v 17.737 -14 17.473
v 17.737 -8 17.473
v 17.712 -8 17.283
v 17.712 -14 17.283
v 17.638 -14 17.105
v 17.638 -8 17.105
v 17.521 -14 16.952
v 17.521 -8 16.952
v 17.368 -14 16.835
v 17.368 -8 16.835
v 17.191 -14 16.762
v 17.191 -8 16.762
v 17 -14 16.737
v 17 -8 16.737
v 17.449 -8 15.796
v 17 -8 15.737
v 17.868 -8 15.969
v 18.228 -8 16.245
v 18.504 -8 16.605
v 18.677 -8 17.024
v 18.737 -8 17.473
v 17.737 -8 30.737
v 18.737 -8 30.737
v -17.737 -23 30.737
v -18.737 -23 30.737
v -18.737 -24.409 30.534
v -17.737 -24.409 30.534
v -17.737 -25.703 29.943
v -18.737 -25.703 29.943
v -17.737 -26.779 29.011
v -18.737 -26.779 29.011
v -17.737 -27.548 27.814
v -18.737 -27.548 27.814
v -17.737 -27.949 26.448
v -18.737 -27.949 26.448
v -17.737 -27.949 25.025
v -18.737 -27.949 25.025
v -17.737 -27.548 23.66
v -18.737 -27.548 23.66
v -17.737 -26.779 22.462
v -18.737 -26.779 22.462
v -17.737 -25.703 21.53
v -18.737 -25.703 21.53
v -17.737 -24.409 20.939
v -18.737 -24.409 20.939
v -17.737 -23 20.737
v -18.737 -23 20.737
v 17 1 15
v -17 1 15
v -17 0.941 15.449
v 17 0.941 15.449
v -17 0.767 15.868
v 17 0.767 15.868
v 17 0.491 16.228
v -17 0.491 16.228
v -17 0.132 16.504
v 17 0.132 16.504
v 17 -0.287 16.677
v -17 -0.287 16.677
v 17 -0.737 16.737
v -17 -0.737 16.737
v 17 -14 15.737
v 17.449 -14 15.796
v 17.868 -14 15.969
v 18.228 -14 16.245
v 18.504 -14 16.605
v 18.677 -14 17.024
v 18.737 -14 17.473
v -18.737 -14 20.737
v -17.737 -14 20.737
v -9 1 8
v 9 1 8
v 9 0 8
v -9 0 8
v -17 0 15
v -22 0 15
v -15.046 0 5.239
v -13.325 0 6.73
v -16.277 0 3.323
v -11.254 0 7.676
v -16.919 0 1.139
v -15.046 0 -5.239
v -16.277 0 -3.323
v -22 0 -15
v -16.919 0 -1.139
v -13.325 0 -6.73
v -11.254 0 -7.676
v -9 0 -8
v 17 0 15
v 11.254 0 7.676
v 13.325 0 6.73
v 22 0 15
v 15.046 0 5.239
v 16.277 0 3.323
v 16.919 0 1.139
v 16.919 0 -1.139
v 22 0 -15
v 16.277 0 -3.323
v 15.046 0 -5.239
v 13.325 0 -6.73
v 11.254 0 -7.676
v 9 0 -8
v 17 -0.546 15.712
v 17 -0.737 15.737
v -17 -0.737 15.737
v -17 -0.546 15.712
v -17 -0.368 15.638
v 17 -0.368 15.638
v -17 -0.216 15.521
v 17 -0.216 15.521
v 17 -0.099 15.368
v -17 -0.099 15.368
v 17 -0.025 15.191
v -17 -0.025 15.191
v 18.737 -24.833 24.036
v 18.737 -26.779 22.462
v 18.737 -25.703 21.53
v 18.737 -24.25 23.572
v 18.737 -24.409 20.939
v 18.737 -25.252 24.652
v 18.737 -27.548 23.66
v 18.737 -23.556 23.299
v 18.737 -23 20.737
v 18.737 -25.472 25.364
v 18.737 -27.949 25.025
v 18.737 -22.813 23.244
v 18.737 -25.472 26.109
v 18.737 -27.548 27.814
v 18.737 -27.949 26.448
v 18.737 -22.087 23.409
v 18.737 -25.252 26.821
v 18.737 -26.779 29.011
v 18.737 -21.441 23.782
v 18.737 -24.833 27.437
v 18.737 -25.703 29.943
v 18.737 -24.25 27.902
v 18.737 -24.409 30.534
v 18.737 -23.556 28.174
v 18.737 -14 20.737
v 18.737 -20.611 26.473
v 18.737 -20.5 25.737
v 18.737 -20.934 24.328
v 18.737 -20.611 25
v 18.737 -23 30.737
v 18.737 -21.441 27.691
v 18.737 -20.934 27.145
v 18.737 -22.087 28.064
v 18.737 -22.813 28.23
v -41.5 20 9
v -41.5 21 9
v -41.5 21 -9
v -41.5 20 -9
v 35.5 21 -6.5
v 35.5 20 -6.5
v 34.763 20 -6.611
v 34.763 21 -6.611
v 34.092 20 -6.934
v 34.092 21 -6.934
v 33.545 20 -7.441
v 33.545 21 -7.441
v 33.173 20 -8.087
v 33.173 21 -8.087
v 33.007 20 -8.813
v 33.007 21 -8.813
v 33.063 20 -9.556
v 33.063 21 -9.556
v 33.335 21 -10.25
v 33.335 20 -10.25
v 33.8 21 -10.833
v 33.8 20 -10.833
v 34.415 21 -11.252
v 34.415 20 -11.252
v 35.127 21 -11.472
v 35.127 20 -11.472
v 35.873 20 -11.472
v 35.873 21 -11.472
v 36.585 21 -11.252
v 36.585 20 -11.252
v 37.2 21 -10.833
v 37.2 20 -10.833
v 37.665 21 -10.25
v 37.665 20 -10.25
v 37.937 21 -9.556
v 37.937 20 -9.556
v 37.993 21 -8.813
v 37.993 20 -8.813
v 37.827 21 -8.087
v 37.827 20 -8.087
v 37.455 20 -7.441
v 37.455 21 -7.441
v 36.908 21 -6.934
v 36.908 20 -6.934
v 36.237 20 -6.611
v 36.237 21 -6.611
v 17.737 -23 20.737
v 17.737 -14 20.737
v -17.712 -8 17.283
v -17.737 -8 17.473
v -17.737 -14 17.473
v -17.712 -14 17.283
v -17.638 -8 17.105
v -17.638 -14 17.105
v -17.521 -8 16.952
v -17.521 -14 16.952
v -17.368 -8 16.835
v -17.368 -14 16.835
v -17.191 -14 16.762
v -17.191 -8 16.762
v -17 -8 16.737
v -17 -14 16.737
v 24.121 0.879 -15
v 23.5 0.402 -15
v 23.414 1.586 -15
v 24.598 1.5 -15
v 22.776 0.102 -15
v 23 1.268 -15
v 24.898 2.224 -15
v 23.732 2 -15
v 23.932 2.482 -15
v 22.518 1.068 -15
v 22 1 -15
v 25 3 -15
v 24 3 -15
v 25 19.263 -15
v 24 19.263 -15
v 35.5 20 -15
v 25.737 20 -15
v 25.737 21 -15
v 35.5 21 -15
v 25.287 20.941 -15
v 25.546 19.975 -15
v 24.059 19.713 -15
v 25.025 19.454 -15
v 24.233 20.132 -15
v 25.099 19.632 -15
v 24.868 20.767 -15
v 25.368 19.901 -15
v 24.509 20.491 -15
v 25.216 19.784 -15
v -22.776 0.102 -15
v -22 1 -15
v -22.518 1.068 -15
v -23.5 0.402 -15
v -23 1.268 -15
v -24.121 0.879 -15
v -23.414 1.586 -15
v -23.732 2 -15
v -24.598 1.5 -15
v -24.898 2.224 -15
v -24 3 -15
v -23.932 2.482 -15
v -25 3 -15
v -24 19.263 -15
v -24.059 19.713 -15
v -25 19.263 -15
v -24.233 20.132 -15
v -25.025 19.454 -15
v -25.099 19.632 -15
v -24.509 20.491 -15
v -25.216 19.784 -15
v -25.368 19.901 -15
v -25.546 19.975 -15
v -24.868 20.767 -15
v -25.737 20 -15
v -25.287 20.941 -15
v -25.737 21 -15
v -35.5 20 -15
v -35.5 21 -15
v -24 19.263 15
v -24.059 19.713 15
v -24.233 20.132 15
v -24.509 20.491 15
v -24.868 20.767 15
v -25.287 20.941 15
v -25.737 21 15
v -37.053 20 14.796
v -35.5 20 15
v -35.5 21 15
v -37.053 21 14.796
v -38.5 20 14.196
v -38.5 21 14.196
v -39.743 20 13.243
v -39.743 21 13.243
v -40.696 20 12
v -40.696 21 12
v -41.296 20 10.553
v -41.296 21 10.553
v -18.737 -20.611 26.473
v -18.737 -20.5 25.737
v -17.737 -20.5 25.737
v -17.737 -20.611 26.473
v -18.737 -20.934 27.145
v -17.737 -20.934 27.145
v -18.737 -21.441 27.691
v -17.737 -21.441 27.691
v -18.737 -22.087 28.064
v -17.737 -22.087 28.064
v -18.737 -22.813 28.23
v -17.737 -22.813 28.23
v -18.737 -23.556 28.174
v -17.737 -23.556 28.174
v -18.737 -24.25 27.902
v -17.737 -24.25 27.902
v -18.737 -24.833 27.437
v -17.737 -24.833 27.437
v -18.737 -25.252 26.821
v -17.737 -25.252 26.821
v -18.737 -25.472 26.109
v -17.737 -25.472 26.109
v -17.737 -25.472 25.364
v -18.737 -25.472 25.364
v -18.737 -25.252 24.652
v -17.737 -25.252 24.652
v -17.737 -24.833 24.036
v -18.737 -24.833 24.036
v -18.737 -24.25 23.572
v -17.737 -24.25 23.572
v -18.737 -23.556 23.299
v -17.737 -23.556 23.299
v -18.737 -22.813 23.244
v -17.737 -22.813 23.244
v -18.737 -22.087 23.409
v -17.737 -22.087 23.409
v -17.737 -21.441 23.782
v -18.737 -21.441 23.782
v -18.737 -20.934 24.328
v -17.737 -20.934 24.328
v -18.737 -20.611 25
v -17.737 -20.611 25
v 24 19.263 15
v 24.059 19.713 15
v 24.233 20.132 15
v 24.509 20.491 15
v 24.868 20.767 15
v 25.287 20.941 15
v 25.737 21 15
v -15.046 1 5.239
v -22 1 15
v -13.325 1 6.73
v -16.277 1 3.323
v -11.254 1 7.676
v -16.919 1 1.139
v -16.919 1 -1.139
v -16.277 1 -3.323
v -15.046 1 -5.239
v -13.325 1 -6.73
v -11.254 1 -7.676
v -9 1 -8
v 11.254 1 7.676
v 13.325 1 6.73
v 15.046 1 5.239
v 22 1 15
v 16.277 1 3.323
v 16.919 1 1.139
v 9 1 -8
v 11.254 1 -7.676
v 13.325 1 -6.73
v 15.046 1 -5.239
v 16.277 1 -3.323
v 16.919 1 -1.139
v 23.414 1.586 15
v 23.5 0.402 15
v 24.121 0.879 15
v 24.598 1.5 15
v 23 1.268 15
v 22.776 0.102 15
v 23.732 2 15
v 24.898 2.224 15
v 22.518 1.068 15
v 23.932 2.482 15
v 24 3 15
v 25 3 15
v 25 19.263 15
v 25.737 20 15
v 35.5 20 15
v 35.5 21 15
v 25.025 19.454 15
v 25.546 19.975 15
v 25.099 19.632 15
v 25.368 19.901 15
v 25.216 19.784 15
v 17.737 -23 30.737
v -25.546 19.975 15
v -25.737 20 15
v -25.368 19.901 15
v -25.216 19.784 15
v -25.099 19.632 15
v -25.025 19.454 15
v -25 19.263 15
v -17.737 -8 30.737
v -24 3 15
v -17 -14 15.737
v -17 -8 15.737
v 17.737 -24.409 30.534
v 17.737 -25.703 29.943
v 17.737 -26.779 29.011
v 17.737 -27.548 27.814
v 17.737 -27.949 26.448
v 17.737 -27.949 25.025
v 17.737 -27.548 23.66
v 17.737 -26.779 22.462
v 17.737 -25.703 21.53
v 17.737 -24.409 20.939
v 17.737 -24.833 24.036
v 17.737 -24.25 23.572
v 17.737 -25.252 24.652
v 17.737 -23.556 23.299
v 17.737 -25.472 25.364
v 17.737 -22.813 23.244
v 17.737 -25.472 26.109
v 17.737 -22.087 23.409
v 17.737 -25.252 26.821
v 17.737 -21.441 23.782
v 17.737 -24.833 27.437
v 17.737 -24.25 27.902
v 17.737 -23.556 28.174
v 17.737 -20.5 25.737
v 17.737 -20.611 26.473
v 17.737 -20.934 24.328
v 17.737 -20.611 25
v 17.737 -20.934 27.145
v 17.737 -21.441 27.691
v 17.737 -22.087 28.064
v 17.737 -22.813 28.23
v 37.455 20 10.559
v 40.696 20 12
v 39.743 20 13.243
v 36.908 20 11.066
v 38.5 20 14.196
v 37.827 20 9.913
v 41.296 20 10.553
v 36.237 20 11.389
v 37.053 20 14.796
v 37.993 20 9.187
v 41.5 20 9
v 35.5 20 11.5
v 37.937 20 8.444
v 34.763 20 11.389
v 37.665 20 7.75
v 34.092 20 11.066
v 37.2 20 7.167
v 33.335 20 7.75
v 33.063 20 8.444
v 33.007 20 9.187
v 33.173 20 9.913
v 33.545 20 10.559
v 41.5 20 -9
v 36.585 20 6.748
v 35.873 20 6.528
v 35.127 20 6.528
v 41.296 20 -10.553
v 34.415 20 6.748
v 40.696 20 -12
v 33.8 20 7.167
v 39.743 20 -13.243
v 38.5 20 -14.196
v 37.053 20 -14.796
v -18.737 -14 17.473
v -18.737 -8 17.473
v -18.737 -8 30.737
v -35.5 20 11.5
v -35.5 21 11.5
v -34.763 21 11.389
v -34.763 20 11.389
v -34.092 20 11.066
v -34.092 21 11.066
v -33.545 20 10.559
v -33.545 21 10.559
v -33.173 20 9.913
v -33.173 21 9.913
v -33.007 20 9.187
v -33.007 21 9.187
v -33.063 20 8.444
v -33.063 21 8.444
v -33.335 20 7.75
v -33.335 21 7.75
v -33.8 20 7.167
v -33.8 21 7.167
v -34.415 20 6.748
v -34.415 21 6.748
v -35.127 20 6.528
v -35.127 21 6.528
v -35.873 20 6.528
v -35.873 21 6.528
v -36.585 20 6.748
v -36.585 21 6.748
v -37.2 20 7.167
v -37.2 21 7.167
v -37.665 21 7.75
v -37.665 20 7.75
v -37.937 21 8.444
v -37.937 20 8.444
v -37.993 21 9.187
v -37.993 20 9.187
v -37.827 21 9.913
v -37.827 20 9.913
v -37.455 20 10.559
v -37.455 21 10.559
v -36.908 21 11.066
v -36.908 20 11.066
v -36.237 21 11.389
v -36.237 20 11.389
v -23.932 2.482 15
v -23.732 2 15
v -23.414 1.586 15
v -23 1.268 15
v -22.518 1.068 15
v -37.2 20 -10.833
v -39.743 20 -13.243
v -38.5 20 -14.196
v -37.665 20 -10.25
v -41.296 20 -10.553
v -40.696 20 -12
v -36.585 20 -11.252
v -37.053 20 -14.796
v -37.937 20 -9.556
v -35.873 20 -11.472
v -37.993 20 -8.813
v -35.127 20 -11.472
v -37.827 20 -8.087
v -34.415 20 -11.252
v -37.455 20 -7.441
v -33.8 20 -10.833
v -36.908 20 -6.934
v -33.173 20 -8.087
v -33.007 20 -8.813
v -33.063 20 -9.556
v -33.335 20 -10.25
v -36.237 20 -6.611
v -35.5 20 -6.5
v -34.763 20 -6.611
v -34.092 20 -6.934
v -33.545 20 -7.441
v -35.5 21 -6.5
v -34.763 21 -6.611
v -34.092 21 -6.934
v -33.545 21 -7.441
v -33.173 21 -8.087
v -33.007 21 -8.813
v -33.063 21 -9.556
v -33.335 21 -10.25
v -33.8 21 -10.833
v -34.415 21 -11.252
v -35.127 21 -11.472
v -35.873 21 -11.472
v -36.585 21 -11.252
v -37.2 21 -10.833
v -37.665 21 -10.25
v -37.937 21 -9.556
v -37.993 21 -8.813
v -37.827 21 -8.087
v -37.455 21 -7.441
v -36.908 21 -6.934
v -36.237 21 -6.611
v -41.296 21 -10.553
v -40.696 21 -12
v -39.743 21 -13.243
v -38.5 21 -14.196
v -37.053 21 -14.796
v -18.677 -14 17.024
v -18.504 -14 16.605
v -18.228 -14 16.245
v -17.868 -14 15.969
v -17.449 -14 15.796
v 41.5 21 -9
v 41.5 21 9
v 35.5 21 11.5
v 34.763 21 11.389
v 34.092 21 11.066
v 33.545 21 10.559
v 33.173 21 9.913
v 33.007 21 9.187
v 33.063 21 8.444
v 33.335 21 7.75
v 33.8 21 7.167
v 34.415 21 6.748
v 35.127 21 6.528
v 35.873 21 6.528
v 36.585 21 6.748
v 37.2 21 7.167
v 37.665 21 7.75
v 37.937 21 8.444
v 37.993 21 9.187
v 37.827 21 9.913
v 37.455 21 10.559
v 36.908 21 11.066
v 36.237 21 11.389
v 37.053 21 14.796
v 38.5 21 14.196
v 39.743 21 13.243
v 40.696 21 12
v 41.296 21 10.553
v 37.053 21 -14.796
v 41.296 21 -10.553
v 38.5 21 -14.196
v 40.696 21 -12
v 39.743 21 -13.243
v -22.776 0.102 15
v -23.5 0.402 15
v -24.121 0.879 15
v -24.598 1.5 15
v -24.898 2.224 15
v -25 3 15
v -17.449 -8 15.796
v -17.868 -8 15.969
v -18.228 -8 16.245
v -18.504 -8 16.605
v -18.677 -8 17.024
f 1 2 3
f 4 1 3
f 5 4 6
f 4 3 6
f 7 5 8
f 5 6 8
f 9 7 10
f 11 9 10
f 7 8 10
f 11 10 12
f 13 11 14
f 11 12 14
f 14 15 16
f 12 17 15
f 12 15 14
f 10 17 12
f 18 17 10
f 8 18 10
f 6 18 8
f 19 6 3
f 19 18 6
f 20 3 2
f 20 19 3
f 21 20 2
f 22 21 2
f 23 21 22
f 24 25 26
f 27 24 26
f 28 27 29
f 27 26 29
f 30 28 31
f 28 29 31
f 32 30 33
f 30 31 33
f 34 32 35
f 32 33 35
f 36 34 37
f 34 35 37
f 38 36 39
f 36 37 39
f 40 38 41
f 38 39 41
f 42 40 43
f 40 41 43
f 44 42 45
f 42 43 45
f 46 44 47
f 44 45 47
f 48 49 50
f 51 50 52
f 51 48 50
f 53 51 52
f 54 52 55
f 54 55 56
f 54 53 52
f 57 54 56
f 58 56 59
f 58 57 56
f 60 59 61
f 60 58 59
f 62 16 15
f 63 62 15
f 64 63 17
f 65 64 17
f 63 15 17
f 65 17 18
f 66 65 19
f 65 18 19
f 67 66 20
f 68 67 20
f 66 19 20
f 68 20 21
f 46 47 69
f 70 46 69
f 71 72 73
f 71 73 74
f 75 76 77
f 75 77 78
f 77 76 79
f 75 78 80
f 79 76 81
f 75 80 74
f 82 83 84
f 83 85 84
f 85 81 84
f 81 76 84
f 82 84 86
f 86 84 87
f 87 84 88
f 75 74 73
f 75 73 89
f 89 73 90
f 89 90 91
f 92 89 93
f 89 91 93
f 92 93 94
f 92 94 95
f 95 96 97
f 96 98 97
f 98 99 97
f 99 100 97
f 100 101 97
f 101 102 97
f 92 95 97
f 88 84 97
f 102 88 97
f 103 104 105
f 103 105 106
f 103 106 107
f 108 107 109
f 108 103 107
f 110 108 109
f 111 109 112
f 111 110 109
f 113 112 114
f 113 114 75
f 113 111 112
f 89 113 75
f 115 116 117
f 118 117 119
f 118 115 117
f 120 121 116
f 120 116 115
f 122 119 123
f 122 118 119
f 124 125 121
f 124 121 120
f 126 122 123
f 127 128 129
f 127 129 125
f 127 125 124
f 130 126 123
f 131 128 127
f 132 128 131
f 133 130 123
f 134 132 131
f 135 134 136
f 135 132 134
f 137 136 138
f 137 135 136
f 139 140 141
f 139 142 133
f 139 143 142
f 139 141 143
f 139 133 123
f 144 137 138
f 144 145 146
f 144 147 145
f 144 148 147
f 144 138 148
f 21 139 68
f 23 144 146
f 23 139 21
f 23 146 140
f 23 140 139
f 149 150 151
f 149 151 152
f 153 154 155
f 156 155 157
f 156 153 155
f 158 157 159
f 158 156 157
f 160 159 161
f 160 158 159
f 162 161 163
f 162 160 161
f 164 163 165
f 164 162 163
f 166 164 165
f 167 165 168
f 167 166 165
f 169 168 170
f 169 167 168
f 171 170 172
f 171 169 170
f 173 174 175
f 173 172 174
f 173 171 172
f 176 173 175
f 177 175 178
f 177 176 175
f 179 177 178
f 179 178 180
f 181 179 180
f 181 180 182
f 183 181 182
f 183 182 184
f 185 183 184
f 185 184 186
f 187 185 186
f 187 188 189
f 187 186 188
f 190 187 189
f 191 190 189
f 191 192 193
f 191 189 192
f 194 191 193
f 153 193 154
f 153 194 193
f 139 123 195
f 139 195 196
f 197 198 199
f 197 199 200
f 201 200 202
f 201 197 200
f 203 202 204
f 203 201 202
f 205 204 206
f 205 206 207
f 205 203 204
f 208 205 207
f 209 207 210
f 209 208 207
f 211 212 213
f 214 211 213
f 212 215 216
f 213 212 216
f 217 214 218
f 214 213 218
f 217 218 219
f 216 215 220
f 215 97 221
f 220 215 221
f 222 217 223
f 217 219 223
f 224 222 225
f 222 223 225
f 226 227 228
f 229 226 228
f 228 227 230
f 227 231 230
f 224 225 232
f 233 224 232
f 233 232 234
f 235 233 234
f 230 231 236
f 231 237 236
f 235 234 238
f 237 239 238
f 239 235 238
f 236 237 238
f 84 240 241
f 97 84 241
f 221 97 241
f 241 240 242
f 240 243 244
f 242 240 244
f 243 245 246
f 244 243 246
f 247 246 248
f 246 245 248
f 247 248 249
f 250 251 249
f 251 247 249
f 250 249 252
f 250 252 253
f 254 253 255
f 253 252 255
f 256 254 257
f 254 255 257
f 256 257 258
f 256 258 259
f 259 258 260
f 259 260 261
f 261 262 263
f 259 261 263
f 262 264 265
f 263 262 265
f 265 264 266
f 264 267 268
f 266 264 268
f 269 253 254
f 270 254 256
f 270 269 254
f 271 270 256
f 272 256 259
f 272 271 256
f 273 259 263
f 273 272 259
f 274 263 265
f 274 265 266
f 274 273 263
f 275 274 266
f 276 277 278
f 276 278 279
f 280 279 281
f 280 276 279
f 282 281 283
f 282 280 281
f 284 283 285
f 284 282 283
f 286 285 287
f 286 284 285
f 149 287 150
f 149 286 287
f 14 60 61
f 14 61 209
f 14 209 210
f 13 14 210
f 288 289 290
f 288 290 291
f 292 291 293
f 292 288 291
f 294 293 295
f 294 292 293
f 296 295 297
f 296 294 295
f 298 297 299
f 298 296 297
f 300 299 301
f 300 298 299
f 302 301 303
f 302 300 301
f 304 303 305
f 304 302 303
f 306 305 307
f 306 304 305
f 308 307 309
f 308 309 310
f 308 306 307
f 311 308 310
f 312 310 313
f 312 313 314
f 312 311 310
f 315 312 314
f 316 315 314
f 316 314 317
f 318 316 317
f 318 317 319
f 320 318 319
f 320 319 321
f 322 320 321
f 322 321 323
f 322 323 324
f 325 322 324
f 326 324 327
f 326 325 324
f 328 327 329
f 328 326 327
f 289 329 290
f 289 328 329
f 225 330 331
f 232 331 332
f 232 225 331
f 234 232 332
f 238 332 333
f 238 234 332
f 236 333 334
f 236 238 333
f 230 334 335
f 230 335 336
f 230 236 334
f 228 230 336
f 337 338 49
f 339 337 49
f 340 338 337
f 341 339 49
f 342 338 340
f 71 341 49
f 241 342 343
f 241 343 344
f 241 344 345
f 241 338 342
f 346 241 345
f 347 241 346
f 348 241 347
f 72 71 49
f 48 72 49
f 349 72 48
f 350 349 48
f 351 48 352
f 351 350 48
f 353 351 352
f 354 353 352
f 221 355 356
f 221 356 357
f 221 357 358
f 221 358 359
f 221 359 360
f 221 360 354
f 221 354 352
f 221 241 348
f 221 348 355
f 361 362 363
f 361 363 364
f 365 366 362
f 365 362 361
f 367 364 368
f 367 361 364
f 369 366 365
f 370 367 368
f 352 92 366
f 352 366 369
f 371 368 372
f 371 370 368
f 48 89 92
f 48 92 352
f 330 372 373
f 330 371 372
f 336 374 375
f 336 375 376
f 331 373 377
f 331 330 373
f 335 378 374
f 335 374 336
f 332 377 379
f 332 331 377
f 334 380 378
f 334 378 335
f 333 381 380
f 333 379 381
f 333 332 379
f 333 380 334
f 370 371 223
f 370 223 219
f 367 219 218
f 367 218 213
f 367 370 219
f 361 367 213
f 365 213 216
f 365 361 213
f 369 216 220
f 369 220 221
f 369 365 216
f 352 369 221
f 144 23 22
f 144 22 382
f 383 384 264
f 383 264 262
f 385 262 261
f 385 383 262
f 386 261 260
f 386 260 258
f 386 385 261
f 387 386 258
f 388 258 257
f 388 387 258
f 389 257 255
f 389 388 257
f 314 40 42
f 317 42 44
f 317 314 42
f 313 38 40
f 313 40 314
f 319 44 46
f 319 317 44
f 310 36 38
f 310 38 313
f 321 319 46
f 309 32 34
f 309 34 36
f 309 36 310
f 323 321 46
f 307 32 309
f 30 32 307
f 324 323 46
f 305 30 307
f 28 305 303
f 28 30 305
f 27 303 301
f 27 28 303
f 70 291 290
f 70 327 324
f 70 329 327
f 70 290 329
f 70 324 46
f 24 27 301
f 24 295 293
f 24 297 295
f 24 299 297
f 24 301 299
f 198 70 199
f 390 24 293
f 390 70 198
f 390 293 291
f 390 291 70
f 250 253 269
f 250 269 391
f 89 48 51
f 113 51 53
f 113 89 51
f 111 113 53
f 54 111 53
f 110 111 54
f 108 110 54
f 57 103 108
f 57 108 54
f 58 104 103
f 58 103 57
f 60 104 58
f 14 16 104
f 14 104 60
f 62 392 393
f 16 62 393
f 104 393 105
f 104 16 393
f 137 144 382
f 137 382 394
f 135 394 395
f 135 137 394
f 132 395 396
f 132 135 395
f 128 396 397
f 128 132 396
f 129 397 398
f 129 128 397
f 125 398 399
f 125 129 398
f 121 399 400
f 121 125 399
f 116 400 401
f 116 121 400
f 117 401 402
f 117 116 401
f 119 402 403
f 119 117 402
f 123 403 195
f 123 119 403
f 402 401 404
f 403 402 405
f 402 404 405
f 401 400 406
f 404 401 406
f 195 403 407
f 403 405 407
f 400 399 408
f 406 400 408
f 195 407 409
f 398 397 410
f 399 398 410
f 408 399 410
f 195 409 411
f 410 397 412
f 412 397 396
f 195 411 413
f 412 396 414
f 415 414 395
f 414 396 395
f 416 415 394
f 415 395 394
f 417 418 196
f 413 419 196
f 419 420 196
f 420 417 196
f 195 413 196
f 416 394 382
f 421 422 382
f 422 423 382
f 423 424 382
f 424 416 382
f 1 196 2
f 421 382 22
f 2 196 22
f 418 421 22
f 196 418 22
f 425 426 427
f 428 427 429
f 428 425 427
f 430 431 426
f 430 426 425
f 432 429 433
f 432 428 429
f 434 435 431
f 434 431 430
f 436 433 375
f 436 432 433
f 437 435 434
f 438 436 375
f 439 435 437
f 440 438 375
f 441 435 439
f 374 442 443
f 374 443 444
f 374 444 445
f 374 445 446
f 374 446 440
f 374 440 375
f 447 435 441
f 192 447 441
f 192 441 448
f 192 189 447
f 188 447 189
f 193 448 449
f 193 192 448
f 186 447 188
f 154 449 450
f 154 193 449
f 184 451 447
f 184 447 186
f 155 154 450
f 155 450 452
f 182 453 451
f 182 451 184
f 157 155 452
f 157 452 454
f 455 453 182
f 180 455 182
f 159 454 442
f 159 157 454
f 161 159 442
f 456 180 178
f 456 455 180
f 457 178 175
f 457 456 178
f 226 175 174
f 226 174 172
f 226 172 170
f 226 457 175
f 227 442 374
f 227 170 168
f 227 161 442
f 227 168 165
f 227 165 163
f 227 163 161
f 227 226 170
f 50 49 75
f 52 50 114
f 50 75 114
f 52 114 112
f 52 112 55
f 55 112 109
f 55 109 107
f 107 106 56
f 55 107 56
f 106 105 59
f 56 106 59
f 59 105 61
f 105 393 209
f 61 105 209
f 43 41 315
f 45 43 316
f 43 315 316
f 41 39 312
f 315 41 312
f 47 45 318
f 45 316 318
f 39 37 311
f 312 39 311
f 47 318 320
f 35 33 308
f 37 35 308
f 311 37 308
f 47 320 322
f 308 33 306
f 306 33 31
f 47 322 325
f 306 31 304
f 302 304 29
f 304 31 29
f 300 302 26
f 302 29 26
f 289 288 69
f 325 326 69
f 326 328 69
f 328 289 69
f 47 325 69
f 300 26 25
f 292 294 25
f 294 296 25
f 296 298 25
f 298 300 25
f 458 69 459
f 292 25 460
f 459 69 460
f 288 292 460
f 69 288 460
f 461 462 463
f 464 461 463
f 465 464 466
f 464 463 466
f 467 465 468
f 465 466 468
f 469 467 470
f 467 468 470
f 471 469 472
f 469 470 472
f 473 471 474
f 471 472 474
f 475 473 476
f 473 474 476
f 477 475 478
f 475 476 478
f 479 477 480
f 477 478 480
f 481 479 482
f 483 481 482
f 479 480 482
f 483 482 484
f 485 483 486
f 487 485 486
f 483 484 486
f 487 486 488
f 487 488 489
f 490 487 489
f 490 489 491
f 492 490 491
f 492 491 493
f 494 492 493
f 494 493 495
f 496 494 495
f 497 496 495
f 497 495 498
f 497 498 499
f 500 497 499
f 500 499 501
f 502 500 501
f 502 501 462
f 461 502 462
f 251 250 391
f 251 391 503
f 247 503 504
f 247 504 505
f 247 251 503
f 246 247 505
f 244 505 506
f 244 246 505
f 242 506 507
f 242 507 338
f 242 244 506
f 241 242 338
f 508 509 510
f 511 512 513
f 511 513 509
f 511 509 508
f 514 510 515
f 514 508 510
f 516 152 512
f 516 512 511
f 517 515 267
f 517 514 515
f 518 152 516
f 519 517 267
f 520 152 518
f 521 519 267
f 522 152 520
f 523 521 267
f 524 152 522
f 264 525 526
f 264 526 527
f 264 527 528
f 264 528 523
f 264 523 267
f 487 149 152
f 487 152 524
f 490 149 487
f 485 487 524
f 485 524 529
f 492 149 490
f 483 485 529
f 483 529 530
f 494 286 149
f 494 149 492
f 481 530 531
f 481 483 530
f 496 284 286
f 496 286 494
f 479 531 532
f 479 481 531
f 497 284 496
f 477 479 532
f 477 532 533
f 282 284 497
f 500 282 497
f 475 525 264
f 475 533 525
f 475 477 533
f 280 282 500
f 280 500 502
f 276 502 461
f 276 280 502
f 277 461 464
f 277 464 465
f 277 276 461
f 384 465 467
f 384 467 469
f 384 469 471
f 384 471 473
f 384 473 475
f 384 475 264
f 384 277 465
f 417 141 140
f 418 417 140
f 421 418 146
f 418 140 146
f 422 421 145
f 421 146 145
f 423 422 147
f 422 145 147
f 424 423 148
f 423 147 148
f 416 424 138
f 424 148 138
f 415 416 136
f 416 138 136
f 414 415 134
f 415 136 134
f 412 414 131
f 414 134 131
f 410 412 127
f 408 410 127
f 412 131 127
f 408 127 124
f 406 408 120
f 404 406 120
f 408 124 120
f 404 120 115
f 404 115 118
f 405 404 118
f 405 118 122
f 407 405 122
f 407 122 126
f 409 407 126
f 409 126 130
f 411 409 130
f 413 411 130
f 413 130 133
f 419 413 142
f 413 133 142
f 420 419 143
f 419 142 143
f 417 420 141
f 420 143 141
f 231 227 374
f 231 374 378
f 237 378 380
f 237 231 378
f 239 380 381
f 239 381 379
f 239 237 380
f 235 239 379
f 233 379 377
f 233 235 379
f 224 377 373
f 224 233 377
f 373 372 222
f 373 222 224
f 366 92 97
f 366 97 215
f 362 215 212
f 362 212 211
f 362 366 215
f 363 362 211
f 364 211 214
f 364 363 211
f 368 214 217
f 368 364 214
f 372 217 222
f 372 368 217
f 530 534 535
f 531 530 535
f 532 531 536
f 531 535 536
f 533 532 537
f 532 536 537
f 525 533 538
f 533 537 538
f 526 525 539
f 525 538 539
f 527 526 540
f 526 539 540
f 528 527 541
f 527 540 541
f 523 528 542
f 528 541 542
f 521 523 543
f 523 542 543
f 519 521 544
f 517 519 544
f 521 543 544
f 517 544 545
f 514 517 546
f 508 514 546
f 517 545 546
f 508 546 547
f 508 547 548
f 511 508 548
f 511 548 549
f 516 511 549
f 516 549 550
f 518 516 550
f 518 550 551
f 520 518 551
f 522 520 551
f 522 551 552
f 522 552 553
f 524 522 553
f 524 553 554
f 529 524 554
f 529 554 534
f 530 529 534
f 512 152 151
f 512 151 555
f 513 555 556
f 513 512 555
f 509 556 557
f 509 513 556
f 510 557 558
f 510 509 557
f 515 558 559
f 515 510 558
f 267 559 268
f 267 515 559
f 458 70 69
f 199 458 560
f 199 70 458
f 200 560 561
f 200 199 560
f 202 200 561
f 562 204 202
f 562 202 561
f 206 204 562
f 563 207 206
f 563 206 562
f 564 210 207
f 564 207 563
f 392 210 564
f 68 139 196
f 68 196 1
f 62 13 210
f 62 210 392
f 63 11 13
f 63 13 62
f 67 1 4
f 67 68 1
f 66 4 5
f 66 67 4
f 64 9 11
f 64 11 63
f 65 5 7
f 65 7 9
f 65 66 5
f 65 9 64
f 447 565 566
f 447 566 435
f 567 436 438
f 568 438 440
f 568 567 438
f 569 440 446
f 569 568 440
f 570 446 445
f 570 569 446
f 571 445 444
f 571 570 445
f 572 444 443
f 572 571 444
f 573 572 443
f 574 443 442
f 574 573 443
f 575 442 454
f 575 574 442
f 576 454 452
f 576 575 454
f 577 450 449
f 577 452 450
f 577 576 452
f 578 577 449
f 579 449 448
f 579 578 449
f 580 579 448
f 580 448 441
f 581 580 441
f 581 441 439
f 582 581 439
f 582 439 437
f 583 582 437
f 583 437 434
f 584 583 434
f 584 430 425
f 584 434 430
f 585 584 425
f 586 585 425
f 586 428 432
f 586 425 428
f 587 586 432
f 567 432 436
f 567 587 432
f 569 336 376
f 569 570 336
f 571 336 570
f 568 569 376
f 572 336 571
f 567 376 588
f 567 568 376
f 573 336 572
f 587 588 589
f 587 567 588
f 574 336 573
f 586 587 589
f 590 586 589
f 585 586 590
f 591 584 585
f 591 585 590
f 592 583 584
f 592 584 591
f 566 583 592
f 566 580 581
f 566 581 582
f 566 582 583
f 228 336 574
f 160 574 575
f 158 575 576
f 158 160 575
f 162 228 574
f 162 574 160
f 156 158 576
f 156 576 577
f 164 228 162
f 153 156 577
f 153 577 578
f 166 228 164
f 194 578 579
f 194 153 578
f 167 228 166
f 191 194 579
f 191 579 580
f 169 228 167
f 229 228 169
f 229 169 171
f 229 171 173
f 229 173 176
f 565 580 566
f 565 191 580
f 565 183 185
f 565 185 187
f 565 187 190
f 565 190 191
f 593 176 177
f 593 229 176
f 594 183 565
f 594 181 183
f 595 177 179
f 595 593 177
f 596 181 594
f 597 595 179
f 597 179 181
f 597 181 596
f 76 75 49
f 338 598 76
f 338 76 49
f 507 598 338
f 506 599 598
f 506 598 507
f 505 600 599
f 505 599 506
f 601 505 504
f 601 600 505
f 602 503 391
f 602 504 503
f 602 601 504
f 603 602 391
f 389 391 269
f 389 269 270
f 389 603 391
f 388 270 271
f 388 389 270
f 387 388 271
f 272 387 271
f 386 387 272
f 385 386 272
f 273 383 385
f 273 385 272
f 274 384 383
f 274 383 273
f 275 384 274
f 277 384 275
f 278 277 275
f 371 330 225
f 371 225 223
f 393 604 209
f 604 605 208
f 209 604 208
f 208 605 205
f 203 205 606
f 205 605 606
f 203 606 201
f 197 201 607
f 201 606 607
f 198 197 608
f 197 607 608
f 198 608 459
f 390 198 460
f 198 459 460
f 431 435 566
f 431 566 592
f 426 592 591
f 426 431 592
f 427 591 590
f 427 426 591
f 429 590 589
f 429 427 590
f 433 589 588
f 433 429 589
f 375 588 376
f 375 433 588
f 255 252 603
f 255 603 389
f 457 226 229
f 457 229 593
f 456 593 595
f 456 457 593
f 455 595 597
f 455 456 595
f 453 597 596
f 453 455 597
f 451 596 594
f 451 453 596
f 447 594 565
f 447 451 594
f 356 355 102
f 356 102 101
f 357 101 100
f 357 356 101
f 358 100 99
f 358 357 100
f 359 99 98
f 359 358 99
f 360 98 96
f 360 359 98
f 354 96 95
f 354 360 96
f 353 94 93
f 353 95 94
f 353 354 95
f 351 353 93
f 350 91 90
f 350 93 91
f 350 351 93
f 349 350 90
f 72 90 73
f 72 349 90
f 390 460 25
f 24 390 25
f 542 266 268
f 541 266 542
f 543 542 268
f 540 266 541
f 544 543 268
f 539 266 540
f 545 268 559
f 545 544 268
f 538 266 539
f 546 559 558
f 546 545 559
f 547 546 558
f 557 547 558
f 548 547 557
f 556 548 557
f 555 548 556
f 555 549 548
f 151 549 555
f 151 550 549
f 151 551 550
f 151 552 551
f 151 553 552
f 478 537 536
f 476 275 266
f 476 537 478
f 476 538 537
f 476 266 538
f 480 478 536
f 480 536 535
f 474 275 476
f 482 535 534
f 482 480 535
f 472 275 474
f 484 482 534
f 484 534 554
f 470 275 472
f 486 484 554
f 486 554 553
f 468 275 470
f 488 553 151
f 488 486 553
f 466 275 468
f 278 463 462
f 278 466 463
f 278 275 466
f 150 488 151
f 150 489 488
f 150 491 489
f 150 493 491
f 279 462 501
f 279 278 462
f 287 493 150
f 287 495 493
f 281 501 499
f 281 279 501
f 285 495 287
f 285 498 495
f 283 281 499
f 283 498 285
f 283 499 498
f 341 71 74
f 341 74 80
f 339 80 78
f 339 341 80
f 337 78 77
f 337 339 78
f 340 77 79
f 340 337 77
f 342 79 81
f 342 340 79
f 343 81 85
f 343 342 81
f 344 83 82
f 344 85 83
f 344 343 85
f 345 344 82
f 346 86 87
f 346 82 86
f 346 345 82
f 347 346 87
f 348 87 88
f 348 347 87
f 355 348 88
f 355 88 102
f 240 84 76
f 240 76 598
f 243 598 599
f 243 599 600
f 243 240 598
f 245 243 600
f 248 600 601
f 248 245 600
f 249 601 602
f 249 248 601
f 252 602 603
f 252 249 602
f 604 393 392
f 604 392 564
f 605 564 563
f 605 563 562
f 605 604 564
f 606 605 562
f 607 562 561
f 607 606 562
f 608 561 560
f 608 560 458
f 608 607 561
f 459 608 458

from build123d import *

# Parameters (mm, degrees)
SKETCH1_W                      = 50
SKETCH1_H                      = 30
BASE_FLANGE1_DEPTH             = 1
EDGE_FLANGE1_STRIP_W           = 8
EDGE_FLANGE1_STRIP_H           = 1
EDGE_FLANGE1_STRIP_CUT_DEPTH   = 30
EDGE_FLANGE1_STRIP_2_W         = 8
EDGE_FLANGE1_STRIP_2_H         = 1
EDGE_FLANGE1_STRIP_CUT_2_DEPTH = 30
EDGE_FLANGE1_DEPTH             = 30
EDGE_FLANGE1_BEND_DEPTH        = 30
EDGE_FLANGE2_STRIP_W           = 5.4732
EDGE_FLANGE2_STRIP_H           = 1
EDGE_FLANGE2_STRIP_CUT_DEPTH   = 30
EDGE_FLANGE2_STRIP_2_W         = 5.4732
EDGE_FLANGE2_STRIP_2_H         = 1
EDGE_FLANGE2_STRIP_CUT_2_DEPTH = 30
EDGE_FLANGE2_DEPTH             = 30
EDGE_FLANGE2_BEND_DEPTH        = 30
BREAK_CORNER1_START            = 20
BREAK_CORNER1_DEPTH            = 1
CUT_EXTRUDE1_DEPTH             = 10
SKETCH25_R                     = 2.5
CUT_EXTRUDE2_DEPTH             = 10
EDGE_FLANGE3_DEPTH             = 34
EDGE_FLANGE4_DEPTH             = 6
EDGE_FLANGE4_START             = -1
EDGE_FLANGE4_PROFILE_R         = 2.5
EDGE_FLANGE4_FLAT_DEPTH        = 1


# Read off the part's stored shape, not the designer's step: Break-Corner1
# Sheet-metal steps are written as plain solids
with BuildPart() as part:
    # Sketch1 → Base-Flange1 (new body)
    with BuildSketch(Plane(origin=(0, 0, 0), x_dir=(1, 0, 0), z_dir=(0, 1, 0))):
        Rectangle(SKETCH1_W, SKETCH1_H)
    extrude(amount=BASE_FLANGE1_DEPTH)

    # Edge-Flange1 strip (across the edge) → Edge-Flange1 strip cut (cut)
    with BuildSketch(Plane(origin=(25, 1, 15), x_dir=(-1, 0, 0), z_dir=(0, 0, -1))):
        with Locations((-1, -0.5)):
            Rectangle(EDGE_FLANGE1_STRIP_W, EDGE_FLANGE1_STRIP_H)
    extrude(amount=EDGE_FLANGE1_STRIP_CUT_DEPTH, mode=Mode.SUBTRACT)

    # Edge-Flange1 strip 2 (across the edge) → Edge-Flange1 strip cut 2 (cut)
    with BuildSketch(Plane(origin=(-25, 1, -15), x_dir=(1, 0, 0), z_dir=(0, 0, 1))):
        with Locations((-1, -0.5)):
            Rectangle(EDGE_FLANGE1_STRIP_2_W, EDGE_FLANGE1_STRIP_2_H)
    extrude(amount=EDGE_FLANGE1_STRIP_CUT_2_DEPTH, mode=Mode.SUBTRACT)

    # Edge-Flange1 section (across the edge) → Edge-Flange1 (add)
    with BuildSketch(Plane(origin=(25, 1, 15), x_dir=(-1, 0, 0), z_dir=(0, 0, -1))):
        with BuildLine():
            Line((0, 2), (0, 19))
            Line((0, 19), (1, 19))
            Line((1, 19), (1, 2))
            ThreePointArc((1, 2), (1.585786438, 0.585786438), (3, 0))
            Line((3, 0), (3, -1))
            ThreePointArc((3, -1), (0.878679656, -0.121320344), (0, 2))
        make_face()
    extrude(amount=EDGE_FLANGE1_DEPTH)

    # Edge-Flange1 section 2 (across the edge) → Edge-Flange1 bend (add)
    with BuildSketch(Plane(origin=(-25, 1, -15), x_dir=(1, 0, 0), z_dir=(0, 0, 1))):
        with BuildLine():
            Line((0, 2), (0, 19))
            Line((0, 19), (1, 19))
            Line((1, 19), (1, 2))
            ThreePointArc((1, 2), (1.585786438, 0.585786438), (3, 0))
            Line((3, 0), (3, -1))
            ThreePointArc((3, -1), (0.878679656, -0.121320344), (0, 2))
        make_face()
    extrude(amount=EDGE_FLANGE1_BEND_DEPTH)

    # Edge-Flange2 strip (across the edge) → Edge-Flange2 strip cut (cut)
    with BuildSketch(Plane(origin=(25, 20, -15), x_dir=(0, -1, 0), z_dir=(0, 0, 1))):
        with Locations((-2, -0.5)):
            Rectangle(EDGE_FLANGE2_STRIP_W, EDGE_FLANGE2_STRIP_H)
    extrude(amount=EDGE_FLANGE2_STRIP_CUT_DEPTH, mode=Mode.SUBTRACT)

    # Edge-Flange2 strip 2 (across the edge) → Edge-Flange2 strip cut 2 (cut)
    with BuildSketch(Plane(origin=(-25, 20, 15), x_dir=(0, -1, 0), z_dir=(0, 0, -1))):
        with Locations((-2, -0.5)):
            Rectangle(EDGE_FLANGE2_STRIP_2_W, EDGE_FLANGE2_STRIP_2_H)
    extrude(amount=EDGE_FLANGE2_STRIP_CUT_2_DEPTH, mode=Mode.SUBTRACT)

    # Edge-Flange2 section (across the edge) → Edge-Flange2 (add)
    with BuildSketch(Plane(origin=(25, 20, -15), x_dir=(0, -1, 0), z_dir=(0, 0, 1))):
        with BuildLine():
            Line((-1, 0.7366), (-1, 16.5))
            Line((-1, 16.5), (0, 16.5))
            Line((0, 16.5), (0, 0.7366))
            ThreePointArc((0, 0.7366), (0.215745145, 0.215745145), (0.7366, 0))
            Line((0.7366, 0), (0.7366, -1))
            ThreePointArc((0.7366, -1), (-0.491361636, -0.491361636), (-1, 0.7366))
        make_face()
    extrude(amount=EDGE_FLANGE2_DEPTH)

    # Edge-Flange2 section 2 (across the edge) → Edge-Flange2 bend (add)
    with BuildSketch(Plane(origin=(-25, 20, 15), x_dir=(0, -1, 0), z_dir=(0, 0, -1))):
        with BuildLine():
            Line((-1, 0.7366), (-1, 16.5))
            Line((-1, 16.5), (0, 16.5))
            Line((0, 16.5), (0, 0.7366))
            ThreePointArc((0, 0.7366), (0.215745145, 0.215745145), (0.7366, 0))
            Line((0.7366, 0), (0.7366, -1))
            ThreePointArc((0.7366, -1), (-0.491361636, -0.491361636), (-1, 0.7366))
        make_face()
    extrude(amount=EDGE_FLANGE2_BEND_DEPTH)

    # Break-Corner1 outline → Break-Corner1 (cut)
    with BuildSketch(Plane(origin=(0, 0, 0), x_dir=(1, 0, 0), z_dir=(0, 1, 0)).offset(BREAK_CORNER1_START)):
        with BuildLine():
            Line((41.5, -15), (41.5, -9))
            ThreePointArc((41.5, -9), (39.742640687, -13.242640687), (35.5, -15))
            Line((35.5, -15), (41.5, -15))
        make_face()
        with BuildLine():
            ThreePointArc((35.5, 15), (39.742640687, 13.242640687), (41.5, 9))
            Line((41.5, 9), (41.5, 15))
            Line((41.5, 15), (35.5, 15))
        make_face()
        with BuildLine():
            Line((-41.5, -15), (-35.5, -15))
            ThreePointArc((-35.5, -15), (-39.742640687, -13.242640687), (-41.5, -9))
            Line((-41.5, -9), (-41.5, -15))
        make_face()
        with BuildLine():
            Line((-41.5, 15), (-41.5, 9))
            ThreePointArc((-41.5, 9), (-39.742640687, 13.242640687), (-35.5, 15))
            Line((-35.5, 15), (-41.5, 15))
        make_face()
    extrude(amount=BREAK_CORNER1_DEPTH, mode=Mode.SUBTRACT)

    # Sketch24 → Cut-Extrude1 (cut)
    with BuildSketch(Plane(origin=(0, 1, 0), x_dir=(1, 0, 0), z_dir=(0, 1, 0))):
        with BuildLine():
            Line((-9, 8), (9, 8))
            ThreePointArc((9, 8), (17, 0), (9, -8))
            Line((9, -8), (-9, -8))
            ThreePointArc((-9, -8), (-17, 0), (-9, 8))
        make_face()
    extrude(amount=-CUT_EXTRUDE1_DEPTH, mode=Mode.SUBTRACT)

    # Sketch25 → Cut-Extrude2 (cut)
    with BuildSketch(Plane(origin=(0, 21, 0), x_dir=(1, 0, 0), z_dir=(0, 1, 0))):
        with Locations(Location((-35.5, 9, 0), (0, 0, 270))):
            Circle(SKETCH25_R)
        with Locations(Location((-35.5, -9, 0), (0, 0, 270))):
            Circle(SKETCH25_R)
    cut_extrude2 = extrude(amount=-CUT_EXTRUDE2_DEPTH, mode=Mode.SUBTRACT)

    # Mirror1: Cut-Extrude2 across plane
    add(cut_extrude2.mirror(Plane(origin=(0, 0, 0), x_dir=(0, 0, 1), z_dir=(1, 0, 0))), mode=Mode.SUBTRACT)

    # Edge-Flange3 section (across the edge) → Edge-Flange3 (add)
    with BuildSketch(Plane(origin=(17, 0, 15.7366), x_dir=(0, 0, -1), z_dir=(-1, 0, 0))):
        with BuildLine():
            Line((-1, 0.7366), (-1, 14))
            Line((-1, 14), (0, 14))
            Line((0, 14), (0, 0.7366))
            ThreePointArc((0, 0.7366), (0.215745145, 0.215745145), (0.7366, 0))
            Line((0.7366, 0), (0.7366, -1))
            ThreePointArc((0.7366, -1), (-0.491361636, -0.491361636), (-1, 0.7366))
        make_face()
    extrude(amount=EDGE_FLANGE3_DEPTH)

    # Edge-Flange4 bend section (across the edge) → Edge-Flange4 (add)
    with BuildSketch(Plane(origin=(-17.7366, -8, 16.7366), x_dir=(1, 0, 0), z_dir=(0, -1, 0))):
        with BuildLine():
            Line((-1, 0.7366), (0, 0.7366))
            ThreePointArc((0, 0.7366), (0.215745145, 0.215745145), (0.7366, 0))
            Line((0.7366, 0), (0.7366, -1))
            ThreePointArc((0.7366, -1), (-0.491361636, -0.491361636), (-1, 0.7366))
        make_face()
    edge_flange4 = extrude(amount=EDGE_FLANGE4_DEPTH)

    # Edge-Flange4 profile (on flange) → Edge-Flange4 flat (add)
    with BuildSketch(Plane(origin=(-17.7366, 0, 16.7366), x_dir=(0, 1, 0), z_dir=(1, 0, 0)).offset(EDGE_FLANGE4_START)):
        with BuildLine():
            ThreePointArc((-23, 14), (-28, 9), (-23, 4))
            Line((-23, 4), (-14, 4))
            Line((-14, 4), (-14, 0.7366))
            Line((-14, 0.7366), (-8, 0.7366))
            Line((-8, 0.7366), (-8, 14))
            Line((-8, 14), (-14, 14))
            Line((-14, 14), (-23, 14))
        make_face()
        with Locations((-23, 9)):
            Circle(EDGE_FLANGE4_PROFILE_R, mode=Mode.SUBTRACT)
    edge_flange4_flat = extrude(amount=EDGE_FLANGE4_FLAT_DEPTH)

    # Mirror2: Edge-Flange4, Edge-Flange4 flat across plane
    add(edge_flange4.mirror(Plane(origin=(0, 0, 0), x_dir=(0, 0, 1), z_dir=(1, 0, 0))))
    add(edge_flange4_flat.mirror(Plane(origin=(0, 0, 0), x_dir=(0, 0, 1), z_dir=(1, 0, 0))))


solid = part.part
